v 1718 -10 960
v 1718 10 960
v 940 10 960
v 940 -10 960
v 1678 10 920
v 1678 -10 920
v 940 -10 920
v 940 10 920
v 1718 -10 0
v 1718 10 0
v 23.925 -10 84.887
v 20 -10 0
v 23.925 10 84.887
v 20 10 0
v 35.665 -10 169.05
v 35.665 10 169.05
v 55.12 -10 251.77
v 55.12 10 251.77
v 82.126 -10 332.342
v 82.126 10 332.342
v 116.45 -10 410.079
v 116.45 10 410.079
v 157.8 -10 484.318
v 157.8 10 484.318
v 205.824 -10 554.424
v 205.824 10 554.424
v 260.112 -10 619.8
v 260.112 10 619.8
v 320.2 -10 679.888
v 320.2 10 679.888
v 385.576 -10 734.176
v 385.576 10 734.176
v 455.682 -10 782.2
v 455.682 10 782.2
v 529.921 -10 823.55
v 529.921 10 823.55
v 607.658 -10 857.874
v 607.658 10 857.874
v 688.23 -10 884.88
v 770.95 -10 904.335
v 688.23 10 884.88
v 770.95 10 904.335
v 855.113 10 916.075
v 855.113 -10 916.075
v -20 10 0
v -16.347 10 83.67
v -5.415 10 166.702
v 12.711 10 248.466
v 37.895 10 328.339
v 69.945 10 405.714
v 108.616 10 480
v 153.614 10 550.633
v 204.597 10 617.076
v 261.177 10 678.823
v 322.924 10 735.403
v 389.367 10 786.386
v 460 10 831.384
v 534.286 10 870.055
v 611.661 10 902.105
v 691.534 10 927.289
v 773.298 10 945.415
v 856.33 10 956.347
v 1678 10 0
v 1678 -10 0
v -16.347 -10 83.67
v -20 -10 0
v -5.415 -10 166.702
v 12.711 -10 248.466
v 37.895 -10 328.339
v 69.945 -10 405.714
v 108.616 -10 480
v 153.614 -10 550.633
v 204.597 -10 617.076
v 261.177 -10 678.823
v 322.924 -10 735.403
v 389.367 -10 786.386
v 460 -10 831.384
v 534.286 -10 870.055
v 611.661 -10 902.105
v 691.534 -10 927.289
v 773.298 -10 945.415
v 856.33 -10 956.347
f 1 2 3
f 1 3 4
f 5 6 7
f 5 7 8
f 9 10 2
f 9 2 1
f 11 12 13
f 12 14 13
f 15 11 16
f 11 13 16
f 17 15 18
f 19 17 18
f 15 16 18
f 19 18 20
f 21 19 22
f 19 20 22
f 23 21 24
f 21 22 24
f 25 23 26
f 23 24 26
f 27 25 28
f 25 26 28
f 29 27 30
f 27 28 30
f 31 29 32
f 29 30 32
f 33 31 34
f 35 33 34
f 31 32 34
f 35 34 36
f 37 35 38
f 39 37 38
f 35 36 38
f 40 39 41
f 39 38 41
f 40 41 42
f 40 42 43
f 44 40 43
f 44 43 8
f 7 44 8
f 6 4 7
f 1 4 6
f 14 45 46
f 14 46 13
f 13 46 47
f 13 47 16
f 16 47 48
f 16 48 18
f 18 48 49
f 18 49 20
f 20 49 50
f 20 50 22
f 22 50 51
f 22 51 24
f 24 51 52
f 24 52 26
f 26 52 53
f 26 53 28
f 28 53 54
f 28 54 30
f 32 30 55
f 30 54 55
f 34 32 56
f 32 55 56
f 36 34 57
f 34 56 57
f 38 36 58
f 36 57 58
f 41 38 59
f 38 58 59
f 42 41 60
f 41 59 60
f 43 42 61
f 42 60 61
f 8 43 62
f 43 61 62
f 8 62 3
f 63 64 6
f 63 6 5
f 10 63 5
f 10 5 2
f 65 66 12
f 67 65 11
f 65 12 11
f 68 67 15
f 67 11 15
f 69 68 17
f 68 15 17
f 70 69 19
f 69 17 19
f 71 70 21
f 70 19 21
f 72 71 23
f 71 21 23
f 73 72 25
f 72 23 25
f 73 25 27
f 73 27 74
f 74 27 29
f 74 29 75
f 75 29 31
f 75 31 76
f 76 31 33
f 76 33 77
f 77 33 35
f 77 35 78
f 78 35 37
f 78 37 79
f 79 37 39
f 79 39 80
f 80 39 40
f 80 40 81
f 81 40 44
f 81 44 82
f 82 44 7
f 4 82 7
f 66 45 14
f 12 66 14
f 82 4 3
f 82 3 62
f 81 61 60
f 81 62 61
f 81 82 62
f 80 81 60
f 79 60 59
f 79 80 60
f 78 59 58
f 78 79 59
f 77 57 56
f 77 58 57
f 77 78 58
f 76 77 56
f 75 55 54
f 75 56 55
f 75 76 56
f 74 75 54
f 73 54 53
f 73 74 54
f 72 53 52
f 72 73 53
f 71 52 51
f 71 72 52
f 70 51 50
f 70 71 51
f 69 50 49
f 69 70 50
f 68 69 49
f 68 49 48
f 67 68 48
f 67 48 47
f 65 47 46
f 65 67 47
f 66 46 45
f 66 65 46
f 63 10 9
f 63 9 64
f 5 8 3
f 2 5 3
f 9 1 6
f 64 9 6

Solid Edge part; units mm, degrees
sketch "Sketch1" plane through (0, 0, 0) normal (0, -1, 0) x (1, 0, 0)
  arc A0 (0, 0) -> (940, 940) centre (940, 0) cw
  line L0 (940, 940) -> (1698, 940)
  line L1 (1698, 940) -> (1698, 0)
sketch "Sketch2" plane through (0, 0, 0) normal (0, 0, 1) x (1, 0, 0)
  line L0 (-20, -10) -> (20, -10)
  line L1 (20, -10) -> (20, 10)
  line L2 (20, 10) -> (-20, 10)
  line L3 (-20, 10) -> (-20, -10)
sweep "ÁtvezetettKihúzás_1" add profiles "Sketch2" path "Sketch1"
extrude "Kihúzás_1" [suppressed]
extrude "Kihúzás_2" [suppressed]
fillet "Lekerekítés_1" [suppressed]
revolve "RevolvedProtrusion1" [suppressed]
